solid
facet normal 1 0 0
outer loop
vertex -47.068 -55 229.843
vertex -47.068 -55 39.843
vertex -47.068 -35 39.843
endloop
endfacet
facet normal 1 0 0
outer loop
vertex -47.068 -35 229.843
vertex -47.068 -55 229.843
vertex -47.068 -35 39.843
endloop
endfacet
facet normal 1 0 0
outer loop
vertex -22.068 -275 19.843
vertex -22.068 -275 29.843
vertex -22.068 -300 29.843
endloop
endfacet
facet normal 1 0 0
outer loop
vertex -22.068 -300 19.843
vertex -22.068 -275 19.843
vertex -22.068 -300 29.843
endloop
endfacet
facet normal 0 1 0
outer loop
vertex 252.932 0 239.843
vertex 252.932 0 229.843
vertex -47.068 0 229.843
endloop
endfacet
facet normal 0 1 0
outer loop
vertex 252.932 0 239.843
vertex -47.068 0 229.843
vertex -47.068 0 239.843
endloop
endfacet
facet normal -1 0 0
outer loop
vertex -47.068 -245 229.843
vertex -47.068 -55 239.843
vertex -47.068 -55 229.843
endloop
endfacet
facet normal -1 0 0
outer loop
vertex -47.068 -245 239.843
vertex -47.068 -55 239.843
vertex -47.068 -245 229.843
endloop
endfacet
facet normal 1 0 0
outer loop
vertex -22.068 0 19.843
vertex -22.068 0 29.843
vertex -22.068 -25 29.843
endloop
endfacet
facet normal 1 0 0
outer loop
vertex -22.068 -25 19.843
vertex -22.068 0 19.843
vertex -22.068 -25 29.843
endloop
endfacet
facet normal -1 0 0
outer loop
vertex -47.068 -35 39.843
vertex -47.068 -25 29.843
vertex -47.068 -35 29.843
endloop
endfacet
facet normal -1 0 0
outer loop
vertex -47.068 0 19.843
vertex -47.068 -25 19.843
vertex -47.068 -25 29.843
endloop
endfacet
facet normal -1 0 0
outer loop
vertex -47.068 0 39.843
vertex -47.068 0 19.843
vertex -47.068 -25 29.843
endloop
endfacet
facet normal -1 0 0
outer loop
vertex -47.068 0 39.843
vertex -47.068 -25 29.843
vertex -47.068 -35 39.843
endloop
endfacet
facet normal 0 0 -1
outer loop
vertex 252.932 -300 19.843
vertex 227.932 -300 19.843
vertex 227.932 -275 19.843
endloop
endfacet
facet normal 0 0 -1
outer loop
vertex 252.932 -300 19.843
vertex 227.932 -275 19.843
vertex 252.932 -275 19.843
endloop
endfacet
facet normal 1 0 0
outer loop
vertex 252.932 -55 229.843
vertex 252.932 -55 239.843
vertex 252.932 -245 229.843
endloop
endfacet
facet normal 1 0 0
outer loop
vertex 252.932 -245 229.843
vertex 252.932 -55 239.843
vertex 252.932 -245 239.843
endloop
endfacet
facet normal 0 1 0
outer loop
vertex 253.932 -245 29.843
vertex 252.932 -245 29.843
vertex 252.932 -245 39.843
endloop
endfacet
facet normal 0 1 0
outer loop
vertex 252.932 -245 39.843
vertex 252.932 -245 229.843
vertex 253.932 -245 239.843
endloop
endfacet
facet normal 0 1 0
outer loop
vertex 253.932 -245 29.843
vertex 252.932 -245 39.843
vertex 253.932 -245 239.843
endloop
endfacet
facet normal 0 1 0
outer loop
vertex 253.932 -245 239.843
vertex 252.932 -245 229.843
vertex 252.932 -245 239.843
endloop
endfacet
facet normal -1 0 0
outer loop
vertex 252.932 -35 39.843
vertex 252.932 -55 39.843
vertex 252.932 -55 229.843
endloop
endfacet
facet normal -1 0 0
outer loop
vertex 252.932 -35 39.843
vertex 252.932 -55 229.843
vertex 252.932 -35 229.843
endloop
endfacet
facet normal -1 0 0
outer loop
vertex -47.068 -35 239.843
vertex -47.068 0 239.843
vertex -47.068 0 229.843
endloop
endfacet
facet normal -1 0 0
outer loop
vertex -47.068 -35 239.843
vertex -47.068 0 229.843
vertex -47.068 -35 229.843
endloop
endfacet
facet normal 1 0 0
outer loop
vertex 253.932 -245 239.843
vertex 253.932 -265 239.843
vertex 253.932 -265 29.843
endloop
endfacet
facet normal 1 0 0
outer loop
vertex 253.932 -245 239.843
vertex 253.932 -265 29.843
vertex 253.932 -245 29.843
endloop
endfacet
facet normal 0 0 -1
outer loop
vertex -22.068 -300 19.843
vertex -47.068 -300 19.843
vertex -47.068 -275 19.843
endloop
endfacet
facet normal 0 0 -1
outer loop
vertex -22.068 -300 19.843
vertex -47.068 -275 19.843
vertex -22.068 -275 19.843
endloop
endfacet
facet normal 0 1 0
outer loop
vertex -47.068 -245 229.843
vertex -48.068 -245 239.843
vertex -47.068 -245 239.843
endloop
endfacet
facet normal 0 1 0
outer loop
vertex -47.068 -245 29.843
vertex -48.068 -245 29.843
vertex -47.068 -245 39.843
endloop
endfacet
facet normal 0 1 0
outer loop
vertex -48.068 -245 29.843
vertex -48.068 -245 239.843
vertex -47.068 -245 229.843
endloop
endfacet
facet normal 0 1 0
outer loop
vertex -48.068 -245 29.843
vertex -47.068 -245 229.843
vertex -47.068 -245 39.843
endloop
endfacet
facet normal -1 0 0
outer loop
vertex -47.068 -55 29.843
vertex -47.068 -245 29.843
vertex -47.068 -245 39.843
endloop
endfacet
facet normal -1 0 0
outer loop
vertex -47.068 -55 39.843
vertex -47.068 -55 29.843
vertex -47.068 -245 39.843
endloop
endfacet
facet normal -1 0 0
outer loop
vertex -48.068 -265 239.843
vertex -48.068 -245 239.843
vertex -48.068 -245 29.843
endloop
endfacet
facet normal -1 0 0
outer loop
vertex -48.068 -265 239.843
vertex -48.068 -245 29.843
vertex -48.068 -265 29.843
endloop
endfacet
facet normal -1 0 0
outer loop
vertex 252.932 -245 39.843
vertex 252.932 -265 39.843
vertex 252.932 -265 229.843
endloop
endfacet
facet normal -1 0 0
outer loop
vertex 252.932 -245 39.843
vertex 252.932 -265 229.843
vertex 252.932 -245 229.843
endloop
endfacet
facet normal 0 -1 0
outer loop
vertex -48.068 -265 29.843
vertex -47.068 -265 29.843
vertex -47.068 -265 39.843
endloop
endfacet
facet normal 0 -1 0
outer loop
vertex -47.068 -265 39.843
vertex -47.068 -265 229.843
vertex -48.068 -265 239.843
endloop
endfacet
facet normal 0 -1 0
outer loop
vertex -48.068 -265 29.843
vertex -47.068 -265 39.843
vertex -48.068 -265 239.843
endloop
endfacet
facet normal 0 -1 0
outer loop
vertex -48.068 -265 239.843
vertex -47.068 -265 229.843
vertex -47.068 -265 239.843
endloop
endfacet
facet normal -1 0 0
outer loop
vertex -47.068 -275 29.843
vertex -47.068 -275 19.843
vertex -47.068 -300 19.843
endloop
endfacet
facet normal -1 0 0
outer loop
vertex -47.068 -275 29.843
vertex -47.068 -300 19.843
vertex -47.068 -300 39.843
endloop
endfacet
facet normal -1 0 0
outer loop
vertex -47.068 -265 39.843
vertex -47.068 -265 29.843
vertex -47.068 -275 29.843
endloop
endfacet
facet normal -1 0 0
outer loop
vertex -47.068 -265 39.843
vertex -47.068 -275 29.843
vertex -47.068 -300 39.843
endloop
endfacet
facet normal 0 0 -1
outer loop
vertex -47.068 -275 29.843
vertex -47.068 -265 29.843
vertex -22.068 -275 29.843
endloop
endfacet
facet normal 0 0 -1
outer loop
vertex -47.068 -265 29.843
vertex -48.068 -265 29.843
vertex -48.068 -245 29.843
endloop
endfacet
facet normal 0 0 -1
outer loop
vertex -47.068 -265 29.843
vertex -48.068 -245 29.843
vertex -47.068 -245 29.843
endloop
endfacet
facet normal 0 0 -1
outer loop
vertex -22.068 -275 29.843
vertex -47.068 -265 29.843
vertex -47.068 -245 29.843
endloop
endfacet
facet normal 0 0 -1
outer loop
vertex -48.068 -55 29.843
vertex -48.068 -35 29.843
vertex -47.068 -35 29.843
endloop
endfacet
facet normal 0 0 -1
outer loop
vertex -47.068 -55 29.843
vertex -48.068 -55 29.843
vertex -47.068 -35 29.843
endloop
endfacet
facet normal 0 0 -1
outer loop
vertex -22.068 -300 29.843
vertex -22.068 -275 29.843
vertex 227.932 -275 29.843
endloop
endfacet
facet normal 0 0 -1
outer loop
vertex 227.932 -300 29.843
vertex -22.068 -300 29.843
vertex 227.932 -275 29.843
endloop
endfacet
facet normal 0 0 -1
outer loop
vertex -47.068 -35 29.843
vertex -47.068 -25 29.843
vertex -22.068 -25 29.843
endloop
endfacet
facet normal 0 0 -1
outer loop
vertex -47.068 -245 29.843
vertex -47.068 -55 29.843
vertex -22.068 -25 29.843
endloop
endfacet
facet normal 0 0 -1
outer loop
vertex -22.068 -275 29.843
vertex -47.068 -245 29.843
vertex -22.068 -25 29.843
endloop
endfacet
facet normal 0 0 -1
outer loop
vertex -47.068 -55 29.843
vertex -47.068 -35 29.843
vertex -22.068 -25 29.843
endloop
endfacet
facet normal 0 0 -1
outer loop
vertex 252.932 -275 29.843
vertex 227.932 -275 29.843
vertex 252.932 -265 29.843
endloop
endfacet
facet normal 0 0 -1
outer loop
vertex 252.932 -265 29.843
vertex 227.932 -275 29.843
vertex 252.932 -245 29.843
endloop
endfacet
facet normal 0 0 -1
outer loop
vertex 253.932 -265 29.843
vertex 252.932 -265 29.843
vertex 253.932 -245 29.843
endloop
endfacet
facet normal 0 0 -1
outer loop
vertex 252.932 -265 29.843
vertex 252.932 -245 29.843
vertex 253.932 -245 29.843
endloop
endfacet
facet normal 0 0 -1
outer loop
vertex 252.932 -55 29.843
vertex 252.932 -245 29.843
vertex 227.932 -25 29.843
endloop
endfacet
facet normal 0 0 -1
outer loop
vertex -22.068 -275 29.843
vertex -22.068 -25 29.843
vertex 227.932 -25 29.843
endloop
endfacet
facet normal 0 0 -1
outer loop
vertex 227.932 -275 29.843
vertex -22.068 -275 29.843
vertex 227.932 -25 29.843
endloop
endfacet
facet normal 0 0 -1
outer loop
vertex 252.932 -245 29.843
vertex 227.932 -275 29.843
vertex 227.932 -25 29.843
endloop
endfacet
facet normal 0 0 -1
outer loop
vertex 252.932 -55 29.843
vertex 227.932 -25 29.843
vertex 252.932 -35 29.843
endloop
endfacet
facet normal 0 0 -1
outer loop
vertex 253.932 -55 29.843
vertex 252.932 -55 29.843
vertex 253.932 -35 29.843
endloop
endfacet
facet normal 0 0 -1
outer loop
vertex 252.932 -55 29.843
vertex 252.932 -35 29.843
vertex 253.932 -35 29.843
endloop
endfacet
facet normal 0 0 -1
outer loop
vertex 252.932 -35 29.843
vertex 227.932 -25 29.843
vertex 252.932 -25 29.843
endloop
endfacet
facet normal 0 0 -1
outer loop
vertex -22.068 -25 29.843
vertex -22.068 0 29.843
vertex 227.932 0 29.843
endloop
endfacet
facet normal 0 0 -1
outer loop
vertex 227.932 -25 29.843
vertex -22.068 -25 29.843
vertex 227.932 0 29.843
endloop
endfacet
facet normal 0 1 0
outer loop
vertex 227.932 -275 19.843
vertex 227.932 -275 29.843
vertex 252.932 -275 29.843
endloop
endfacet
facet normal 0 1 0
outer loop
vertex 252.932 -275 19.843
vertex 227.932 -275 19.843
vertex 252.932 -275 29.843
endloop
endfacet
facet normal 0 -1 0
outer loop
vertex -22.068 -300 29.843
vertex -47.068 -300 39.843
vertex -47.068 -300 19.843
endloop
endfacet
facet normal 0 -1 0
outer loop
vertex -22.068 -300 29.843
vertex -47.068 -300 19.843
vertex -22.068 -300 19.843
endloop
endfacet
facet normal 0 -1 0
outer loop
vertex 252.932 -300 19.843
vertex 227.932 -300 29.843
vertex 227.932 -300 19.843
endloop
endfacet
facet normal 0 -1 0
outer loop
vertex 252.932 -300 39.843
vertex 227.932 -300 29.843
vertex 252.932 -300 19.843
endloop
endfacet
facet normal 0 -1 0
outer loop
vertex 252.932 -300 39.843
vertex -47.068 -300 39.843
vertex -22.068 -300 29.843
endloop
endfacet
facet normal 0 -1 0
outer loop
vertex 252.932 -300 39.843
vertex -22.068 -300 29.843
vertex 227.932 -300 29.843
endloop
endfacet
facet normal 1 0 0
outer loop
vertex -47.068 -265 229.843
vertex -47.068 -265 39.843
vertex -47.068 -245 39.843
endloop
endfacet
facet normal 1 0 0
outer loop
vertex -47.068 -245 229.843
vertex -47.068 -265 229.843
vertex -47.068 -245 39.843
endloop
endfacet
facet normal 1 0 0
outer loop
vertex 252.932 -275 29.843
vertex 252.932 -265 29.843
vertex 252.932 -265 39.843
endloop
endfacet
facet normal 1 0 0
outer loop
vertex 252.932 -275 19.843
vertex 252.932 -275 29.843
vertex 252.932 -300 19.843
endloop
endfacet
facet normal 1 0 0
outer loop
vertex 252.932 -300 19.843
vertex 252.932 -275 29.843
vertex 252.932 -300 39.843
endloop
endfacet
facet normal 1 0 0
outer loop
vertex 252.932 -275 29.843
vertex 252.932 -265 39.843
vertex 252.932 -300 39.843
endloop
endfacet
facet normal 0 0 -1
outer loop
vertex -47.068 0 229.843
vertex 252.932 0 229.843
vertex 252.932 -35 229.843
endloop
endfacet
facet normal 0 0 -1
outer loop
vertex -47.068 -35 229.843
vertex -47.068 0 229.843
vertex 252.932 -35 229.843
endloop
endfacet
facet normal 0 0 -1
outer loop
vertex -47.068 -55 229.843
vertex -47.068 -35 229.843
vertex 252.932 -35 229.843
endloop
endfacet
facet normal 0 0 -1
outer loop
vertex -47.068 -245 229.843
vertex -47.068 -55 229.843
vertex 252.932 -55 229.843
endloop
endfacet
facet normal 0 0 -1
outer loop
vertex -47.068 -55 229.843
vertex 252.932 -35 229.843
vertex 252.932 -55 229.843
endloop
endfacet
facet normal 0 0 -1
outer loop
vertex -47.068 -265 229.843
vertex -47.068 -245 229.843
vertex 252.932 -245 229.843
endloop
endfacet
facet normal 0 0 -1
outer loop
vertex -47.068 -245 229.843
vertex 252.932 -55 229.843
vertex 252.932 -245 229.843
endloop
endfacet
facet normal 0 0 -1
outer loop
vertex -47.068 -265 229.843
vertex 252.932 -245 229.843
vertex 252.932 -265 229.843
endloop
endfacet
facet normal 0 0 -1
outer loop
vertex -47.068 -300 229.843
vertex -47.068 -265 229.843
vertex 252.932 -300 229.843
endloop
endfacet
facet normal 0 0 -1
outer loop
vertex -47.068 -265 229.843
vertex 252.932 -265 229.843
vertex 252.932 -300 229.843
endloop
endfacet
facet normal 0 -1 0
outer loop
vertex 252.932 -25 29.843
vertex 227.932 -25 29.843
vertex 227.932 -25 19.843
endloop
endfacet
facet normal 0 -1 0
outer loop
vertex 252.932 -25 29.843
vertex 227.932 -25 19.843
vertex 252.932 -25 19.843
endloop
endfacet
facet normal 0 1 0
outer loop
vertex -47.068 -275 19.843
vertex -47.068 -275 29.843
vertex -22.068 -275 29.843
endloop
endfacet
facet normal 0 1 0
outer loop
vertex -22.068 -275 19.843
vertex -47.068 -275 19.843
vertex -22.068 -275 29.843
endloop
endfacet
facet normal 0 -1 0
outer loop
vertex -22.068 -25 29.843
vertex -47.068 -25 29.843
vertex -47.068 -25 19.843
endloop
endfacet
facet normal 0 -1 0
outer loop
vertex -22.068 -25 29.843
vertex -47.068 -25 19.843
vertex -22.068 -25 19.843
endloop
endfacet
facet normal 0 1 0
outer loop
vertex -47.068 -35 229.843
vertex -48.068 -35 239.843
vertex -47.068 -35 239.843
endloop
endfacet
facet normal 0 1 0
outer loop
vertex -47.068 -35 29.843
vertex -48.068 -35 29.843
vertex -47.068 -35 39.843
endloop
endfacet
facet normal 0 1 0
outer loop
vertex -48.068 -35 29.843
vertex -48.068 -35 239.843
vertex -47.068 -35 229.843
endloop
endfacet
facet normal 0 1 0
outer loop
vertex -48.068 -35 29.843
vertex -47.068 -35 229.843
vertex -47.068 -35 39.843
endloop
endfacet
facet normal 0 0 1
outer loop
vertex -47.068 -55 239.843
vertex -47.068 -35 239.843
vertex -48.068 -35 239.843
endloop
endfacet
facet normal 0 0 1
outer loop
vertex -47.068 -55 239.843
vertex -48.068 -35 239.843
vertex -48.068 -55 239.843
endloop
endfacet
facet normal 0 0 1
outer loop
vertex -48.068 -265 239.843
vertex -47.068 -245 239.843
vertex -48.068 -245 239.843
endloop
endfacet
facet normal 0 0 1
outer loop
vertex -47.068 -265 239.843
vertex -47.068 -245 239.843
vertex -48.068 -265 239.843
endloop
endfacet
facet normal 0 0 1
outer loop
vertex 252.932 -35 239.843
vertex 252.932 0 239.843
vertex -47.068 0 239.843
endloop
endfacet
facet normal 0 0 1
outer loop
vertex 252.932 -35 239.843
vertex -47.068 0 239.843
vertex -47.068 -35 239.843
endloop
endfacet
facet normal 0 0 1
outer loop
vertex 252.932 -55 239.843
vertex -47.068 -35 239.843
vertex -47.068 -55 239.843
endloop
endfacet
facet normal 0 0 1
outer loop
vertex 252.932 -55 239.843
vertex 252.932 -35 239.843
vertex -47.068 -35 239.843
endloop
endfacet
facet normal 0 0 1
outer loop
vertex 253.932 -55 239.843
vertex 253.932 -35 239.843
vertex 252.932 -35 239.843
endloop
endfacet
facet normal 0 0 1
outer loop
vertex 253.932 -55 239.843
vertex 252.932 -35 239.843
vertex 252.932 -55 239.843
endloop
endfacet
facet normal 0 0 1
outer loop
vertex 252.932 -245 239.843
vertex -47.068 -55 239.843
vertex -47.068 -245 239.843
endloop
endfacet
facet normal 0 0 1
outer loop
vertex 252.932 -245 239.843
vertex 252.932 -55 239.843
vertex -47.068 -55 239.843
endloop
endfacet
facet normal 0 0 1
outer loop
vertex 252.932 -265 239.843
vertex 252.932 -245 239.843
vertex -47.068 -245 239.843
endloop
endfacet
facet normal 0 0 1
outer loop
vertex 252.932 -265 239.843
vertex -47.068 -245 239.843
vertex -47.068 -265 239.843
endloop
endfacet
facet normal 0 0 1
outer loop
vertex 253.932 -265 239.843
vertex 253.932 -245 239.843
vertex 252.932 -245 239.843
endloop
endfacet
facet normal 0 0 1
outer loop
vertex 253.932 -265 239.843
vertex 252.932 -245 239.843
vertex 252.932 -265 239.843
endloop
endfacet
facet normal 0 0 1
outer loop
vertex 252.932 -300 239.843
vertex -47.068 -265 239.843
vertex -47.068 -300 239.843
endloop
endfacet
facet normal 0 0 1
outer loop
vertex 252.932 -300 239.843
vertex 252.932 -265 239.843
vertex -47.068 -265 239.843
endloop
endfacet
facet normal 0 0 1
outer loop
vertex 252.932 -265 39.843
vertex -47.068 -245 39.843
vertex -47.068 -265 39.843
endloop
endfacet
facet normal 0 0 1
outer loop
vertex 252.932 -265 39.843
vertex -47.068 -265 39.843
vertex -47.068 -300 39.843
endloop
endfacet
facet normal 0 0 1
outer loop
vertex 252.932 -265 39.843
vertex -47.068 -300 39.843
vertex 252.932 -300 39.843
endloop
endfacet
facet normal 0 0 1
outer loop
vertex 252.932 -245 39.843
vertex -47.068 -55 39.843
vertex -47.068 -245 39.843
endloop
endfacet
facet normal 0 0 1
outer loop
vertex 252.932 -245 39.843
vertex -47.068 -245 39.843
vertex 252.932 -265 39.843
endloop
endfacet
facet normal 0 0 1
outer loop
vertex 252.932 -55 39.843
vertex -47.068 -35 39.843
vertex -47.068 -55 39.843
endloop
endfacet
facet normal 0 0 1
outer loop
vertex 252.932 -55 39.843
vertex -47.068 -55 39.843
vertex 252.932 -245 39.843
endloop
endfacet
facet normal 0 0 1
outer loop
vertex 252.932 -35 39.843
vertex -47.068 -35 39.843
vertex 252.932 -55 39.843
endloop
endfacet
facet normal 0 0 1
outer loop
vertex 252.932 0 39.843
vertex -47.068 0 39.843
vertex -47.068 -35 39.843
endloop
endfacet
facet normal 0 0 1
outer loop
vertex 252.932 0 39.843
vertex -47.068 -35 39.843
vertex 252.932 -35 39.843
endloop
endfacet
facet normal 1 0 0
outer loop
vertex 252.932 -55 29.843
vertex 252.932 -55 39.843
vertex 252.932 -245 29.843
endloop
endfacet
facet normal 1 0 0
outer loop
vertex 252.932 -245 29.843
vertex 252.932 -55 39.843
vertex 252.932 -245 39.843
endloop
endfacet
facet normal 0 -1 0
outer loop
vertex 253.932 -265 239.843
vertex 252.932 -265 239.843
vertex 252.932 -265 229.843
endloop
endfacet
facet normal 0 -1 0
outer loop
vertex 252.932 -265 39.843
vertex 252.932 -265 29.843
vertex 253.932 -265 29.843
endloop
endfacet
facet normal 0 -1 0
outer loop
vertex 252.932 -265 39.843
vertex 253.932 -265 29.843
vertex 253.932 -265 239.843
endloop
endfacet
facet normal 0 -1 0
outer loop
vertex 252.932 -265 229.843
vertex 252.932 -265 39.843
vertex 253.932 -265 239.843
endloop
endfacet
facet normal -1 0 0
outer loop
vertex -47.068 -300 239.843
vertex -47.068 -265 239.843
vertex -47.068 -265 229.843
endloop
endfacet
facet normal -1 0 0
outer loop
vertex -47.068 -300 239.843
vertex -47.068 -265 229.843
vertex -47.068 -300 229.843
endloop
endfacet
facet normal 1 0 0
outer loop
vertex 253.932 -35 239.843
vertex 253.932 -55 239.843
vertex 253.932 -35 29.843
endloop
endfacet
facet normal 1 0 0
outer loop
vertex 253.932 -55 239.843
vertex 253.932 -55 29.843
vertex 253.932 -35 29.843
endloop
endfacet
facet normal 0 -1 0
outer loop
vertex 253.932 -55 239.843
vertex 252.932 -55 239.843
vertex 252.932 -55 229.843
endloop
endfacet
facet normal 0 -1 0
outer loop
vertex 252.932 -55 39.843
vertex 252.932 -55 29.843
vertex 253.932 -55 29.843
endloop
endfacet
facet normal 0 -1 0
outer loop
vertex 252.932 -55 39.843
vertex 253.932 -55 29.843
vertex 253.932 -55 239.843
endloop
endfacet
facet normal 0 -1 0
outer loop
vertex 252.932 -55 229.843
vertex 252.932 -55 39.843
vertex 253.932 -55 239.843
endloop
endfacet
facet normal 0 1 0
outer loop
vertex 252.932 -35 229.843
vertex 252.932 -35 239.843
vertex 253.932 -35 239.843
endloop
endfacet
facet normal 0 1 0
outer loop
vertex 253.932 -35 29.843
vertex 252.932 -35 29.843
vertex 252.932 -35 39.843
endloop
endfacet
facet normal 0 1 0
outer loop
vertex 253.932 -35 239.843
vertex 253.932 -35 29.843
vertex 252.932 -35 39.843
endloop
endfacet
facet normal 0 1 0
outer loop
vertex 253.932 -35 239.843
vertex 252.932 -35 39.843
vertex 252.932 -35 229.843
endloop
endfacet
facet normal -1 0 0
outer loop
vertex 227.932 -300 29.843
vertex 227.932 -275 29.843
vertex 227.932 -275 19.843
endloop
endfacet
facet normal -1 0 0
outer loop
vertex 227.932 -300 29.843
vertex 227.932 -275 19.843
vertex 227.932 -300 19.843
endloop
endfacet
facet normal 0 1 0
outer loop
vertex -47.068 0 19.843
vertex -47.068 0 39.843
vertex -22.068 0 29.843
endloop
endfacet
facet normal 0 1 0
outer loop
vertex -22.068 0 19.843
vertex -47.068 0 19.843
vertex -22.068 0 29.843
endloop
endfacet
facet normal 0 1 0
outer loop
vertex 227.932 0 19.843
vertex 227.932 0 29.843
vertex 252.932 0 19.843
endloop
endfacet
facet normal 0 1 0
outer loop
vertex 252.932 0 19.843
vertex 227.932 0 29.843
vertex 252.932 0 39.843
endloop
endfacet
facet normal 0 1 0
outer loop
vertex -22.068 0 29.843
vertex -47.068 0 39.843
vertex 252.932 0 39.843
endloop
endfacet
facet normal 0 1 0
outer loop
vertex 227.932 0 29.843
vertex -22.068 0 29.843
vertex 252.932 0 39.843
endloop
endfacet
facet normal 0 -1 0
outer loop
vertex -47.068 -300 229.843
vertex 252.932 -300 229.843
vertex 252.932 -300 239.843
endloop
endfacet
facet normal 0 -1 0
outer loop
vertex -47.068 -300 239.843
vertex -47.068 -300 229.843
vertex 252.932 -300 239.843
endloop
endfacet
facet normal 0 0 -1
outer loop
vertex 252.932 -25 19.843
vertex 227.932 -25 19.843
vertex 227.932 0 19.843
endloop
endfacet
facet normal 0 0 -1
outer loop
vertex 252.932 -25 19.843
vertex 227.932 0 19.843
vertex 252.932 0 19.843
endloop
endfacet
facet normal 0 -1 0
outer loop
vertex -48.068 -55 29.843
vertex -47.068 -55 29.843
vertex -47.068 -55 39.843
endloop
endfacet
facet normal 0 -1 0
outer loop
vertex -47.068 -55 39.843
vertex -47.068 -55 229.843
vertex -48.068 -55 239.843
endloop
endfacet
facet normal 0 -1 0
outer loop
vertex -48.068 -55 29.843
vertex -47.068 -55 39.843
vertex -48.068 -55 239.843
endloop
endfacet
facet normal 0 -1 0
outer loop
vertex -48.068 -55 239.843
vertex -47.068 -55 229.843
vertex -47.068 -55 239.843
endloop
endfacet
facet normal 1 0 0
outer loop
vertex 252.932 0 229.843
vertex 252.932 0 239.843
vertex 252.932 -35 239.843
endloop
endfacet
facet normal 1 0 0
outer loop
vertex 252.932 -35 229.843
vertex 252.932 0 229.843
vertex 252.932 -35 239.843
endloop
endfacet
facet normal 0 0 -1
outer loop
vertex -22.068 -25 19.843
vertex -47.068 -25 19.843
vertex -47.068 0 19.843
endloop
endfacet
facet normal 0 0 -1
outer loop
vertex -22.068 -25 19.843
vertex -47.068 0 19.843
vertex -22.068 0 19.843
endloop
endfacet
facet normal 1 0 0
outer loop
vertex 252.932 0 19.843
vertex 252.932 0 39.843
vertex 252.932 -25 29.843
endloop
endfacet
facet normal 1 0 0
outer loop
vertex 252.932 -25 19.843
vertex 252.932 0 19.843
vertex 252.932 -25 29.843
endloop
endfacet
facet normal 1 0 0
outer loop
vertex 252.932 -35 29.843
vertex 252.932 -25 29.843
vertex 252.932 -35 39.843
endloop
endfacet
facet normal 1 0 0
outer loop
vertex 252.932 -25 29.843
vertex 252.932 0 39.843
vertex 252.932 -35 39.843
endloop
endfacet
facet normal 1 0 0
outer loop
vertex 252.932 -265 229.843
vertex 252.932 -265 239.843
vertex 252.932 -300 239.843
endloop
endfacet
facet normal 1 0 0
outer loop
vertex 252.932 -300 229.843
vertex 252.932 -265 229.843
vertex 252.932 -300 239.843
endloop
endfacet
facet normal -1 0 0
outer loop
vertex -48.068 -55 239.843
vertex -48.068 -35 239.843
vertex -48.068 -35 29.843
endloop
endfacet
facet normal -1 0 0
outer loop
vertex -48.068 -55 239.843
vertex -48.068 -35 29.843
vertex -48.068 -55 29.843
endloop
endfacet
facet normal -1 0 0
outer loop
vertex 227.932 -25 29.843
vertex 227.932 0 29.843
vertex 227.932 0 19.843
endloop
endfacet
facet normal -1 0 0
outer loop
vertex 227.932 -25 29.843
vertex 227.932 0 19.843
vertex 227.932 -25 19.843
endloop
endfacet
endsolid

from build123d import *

# Parameters (mm, degrees)
F0_W      = 300
F0_H      = 10
F1_DEPTH  = 300
F2_W      = 25
F2_H      = 25
F3_DEPTH  = 10
F4_W      = 20
F4_H      = 10
F5_DEPTH  = 1
F6_W      = 20
F6_H      = 10
F7_DEPTH  = 1
F8_W      = 1
F8_H      = 20
F9_DEPTH  = 200
F10_W     = 300
F10_H     = 10
F11_DEPTH = 300


with BuildPart() as f1:
    # F0 (on Front) → F1 (new body)
    with BuildSketch(Plane.XZ):
        with Locations((102.931539, 34.842865)):
            Rectangle(F0_W, F0_H)
    extrude(amount=F1_DEPTH)

    # F2 (on face) → F3 (join)
    with BuildSketch(Plane(origin=(0, 0, 29.842865), x_dir=(1, 0, 0), z_dir=(0, 0, -1))):
        with Locations((240.431539, 12.5)):
            Rectangle(F2_W, F2_H)
        with Locations((-34.568461, 12.5)):
            Rectangle(F2_W, F2_H)
        with Locations((240.431539, 287.5)):
            Rectangle(F2_W, F2_H)
        with Locations((-34.568461, 287.5)):
            Rectangle(F2_W, F2_H)
    extrude(amount=F3_DEPTH)

    # F4 (on face) → F5 (join)
    with BuildSketch(Plane.YZ.offset(252.931539)):
        with Locations((-45, 34.842865)):
            Rectangle(F4_W, F4_H)
        with Locations((-255, 34.842865)):
            Rectangle(F4_W, F4_H)
    extrude(amount=F5_DEPTH)

    # F6 (on face) → F7 (join)
    with BuildSketch(Plane(origin=(-47.068461, 0, 0), x_dir=(0, -1, 0), z_dir=(-1, 0, 0))):
        with Locations((45, 34.842865)):
            Rectangle(F6_W, F6_H)
        with Locations((255, 34.842865)):
            Rectangle(F6_W, F6_H)
    extrude(amount=F7_DEPTH)

    # F8 (on face) → F9 (join)
    with BuildSketch(Plane.XY.offset(39.842865)):
        with Locations((253.431539, -45)):
            Rectangle(F8_W, F8_H)
        with Locations((253.431539, -255)):
            Rectangle(F8_W, F8_H)
        with Locations((-47.568461, -255)):
            Rectangle(F8_W, F8_H)
        with Locations((-47.568461, -45)):
            Rectangle(F8_W, F8_H)
    extrude(amount=F9_DEPTH)

    # F10 (on face) → F11 (join)
    with BuildSketch(Plane(origin=(252.931539, 0, 0), x_dir=(0, -1, 0), z_dir=(-1, 0, 0))):
        with Locations((150, 234.842865)):
            Rectangle(F10_W, F10_H)
    extrude(amount=F11_DEPTH)


solid = f1.part
